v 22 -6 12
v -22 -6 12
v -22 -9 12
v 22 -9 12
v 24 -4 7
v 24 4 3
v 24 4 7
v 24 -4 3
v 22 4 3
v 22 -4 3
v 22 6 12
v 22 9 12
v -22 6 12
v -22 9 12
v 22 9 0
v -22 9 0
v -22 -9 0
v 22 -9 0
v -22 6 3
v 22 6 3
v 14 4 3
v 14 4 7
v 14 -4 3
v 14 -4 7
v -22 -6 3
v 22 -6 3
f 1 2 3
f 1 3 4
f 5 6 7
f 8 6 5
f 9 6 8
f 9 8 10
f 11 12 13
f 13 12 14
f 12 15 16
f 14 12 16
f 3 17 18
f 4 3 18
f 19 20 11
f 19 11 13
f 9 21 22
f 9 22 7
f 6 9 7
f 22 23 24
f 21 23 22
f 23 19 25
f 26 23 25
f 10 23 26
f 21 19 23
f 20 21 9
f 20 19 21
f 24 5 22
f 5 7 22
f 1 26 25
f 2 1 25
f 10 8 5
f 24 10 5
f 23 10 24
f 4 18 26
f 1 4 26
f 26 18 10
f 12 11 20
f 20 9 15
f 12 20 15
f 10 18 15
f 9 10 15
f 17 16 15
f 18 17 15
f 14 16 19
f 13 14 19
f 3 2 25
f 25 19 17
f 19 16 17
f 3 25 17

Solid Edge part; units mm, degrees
sketch "Sketch1" plane through (0, 0, 0) normal (0, 0, 1) x (1, 0, 0)
  line L0 (-22, -9) -> (22, -9)
  line L1 (22, -9) -> (22, 9)
  line L2 (22, 9) -> (-22, 9)
  line L3 (-22, 9) -> (-22, -9)
extrude "Protrusion1" add sketch "Sketch1" along normal blind 3
sketch "Sketch2" plane through (0, 0, 3) normal (0, 0, 1) x (1, 0, 0)
  line L0 (24, -4) -> (14, -4)
  line L1 (14, -4) -> (14, 4)
  line L2 (14, 4) -> (24, 4)
  line L3 (24, 4) -> (24, -4)
extrude "ExtrudedProtrusion_2" add sketch "Sketch2" along normal blind 4
sketch "Sketch3" plane through (0, 0, 3) normal (0, 0, 1) x (1, 0, 0)
  line L0 (-22, -9) -> (22, -9)
  line L1 (22, -9) -> (22, -6)
  line L2 (22, -6) -> (-22, -6)
  line L3 (-22, -6) -> (-22, -9)
  line L4 (22, 6) -> (-22, 6)
  line L5 (-22, 6) -> (-22, 9)
  line L6 (-22, 9) -> (22, 9)
  line L7 (22, 9) -> (22, 6)
  dimension "D1" = 3
extrude "ExtrudedProtrusion_4" add sketch "Sketch3" along normal blind 9
